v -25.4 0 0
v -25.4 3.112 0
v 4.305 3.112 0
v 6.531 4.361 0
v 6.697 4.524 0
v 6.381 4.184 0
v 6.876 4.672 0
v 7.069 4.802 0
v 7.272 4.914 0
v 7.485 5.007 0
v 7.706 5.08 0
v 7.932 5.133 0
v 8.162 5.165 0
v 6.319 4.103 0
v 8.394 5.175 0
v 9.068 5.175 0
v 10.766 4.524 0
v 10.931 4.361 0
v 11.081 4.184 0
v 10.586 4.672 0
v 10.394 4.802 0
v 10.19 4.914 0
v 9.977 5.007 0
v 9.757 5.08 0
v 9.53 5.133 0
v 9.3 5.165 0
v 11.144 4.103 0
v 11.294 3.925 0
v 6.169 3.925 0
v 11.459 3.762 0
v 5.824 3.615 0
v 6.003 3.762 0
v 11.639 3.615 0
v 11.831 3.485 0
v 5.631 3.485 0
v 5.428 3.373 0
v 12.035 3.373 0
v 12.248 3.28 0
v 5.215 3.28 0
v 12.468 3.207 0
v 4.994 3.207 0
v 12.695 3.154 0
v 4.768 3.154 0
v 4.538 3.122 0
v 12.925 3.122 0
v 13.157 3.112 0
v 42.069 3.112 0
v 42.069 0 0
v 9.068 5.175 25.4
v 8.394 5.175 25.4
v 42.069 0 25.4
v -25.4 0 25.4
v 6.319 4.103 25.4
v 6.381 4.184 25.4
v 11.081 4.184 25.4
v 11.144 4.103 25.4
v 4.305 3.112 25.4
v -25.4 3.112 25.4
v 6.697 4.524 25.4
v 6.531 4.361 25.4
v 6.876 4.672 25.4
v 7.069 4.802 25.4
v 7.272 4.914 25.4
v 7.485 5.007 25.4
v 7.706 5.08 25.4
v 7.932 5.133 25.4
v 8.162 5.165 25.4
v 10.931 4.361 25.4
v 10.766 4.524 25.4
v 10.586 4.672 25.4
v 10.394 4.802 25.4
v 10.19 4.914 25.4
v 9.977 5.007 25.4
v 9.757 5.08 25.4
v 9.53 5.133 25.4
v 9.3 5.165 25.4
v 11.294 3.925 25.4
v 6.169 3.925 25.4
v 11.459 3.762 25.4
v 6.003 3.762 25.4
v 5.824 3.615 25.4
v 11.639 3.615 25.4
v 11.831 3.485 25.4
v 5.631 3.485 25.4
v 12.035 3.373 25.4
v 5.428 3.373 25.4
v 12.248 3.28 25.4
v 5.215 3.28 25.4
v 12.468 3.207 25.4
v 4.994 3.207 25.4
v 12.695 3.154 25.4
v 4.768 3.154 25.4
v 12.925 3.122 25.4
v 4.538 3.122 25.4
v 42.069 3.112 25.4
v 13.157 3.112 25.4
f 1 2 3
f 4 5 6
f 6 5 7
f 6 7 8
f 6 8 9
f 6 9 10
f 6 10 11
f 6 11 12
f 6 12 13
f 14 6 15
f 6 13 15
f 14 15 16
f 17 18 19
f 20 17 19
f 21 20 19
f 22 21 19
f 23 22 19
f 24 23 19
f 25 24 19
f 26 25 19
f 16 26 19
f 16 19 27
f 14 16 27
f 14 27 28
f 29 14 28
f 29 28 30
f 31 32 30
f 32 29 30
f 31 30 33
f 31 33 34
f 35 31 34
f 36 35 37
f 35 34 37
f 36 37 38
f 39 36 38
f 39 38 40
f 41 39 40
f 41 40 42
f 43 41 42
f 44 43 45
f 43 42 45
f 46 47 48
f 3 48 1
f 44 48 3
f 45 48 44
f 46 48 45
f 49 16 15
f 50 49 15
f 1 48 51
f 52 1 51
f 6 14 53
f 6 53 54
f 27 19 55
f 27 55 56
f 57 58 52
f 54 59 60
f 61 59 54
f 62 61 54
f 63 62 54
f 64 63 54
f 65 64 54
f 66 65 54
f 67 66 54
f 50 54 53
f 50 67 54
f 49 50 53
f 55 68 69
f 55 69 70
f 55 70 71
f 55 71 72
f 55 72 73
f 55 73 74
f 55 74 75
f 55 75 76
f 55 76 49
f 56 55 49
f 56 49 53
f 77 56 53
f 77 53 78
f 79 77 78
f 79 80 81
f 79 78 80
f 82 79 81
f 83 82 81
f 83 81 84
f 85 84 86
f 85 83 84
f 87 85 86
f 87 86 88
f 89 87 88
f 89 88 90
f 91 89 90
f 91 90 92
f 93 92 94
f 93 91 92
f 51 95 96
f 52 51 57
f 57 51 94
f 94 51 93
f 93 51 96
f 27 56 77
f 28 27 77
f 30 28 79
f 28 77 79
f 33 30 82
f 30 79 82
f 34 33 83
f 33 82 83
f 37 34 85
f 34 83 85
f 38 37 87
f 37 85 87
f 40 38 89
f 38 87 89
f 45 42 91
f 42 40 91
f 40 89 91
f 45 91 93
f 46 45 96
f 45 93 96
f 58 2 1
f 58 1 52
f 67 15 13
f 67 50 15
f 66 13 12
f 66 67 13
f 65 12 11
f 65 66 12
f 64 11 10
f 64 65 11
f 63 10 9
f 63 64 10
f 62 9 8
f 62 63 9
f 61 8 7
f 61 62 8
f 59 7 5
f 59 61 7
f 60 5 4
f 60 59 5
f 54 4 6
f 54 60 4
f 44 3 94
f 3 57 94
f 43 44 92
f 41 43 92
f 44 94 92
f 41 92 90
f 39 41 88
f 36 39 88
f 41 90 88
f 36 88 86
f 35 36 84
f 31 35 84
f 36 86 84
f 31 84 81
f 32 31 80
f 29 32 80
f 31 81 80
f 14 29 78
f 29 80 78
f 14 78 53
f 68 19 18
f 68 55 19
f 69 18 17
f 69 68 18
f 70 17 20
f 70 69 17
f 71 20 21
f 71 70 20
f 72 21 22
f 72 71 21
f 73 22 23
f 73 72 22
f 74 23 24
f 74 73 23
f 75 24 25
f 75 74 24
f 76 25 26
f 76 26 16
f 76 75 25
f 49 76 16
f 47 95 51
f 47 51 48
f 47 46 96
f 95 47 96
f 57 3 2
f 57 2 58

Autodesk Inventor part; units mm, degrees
ref_plane "YZ Plane" through (0, 0, 0) normal (1, 0, 0) x (0, 1, 0)
ref_plane "XZ Plane" through (0, 0, 0) normal (0, 1, 0) x (-1, 0, 0)
ref_plane "XY Plane" through (0, 0, 0) normal (0, 0, 1) x (1, 0, 0)
sketch "Sketch1" plane through (0, 0, 0) normal (0, 0, 1) x (1, 0, 0)
  line L0 (0, 0) -> (4.7625, 0)
  line L1 (4.7625, 3.1115) -> (3.9687, 3.1115) construction
  line L2 (0, 3.1115) -> (0, 0)
  line L3 (4.7625, 0) -> (12.7, 0)
  line L4 (12.7, 0) -> (12.7, 3.1115) construction
  line L5 (12.7, 5.1753) -> (11.1125, 5.1753) construction
  line L6 (4.7625, 5.1753) -> (4.7625, 3.1115) construction
  line L7 (2.3812, 3.1115) -> (2.3812, 0) construction
  line L8 (8.7312, 5.1753) -> (8.7312, 0) construction
  line L9 (2.3812, 3.1115) -> (2.3812, 5.4927) construction
  circle A0 centre (2.3812, 5.4927) radius 2.3812 construction
  line L10 (6.35, 5.1753) -> (6.35, 0) construction
  line L11 (11.1125, 5.1753) -> (11.1125, 0) construction
  line L12 (4.7625, 3.1115) -> (12.7, 3.1115) construction
  line L13 (6.35, 5.1753) -> (4.7625, 5.1753) construction
  line L14 (4.7625, 3.1115) -> (4.7625, 0) construction
  line L15 (11.1125, 5.1753) -> (10.3187, 5.1753) construction
  line L16 (12.7, 3.1115) -> (12.7, 5.1753) construction
  line L17 (8.7312, 5.1753) -> (8.7312, 7.5565) construction
  circle A1 centre (8.7312, 7.5565) radius 2.3813 construction
  line L18 (0.7937, 3.1115) -> (0.7937, 0)
  line L19 (3.9687, 3.1115) -> (3.9687, 0)
  line L20 (7.1437, 5.1753) -> (7.1437, 0)
  line L21 (10.3187, 5.1753) -> (10.3187, 0)
  line L22 (3.9687, 3.1115) -> (0.7937, 3.1115)
  line L23 (0.7937, 3.1115) -> (0, 3.1115)
  line L24 (10.3187, 5.1753) -> (8.7312, 5.1753)
  line L25 (7.1437, 5.1753) -> (6.35, 5.1753) construction
  line L26 (8.7312, 5.1753) -> (7.1437, 5.1753)
  line L27 (3.9687, 3.1115) -> (7.1437, 5.1753)
  line L28 (0, 0) -> (0, 5.5563) construction
  line L29 (0, 5.5563) -> (17.4625, 5.5563) construction
  line L30 (0, 5.5563) -> (0, 7.9375) construction
  line L31 (0, 7.9375) -> (17.4625, 7.9375) construction
  line L32 (12.7, 3.1115) -> (13.4937, 3.1115) construction
  line L33 (12.7, 0) -> (17.4625, 0)
  line L34 (17.4625, 0) -> (17.4625, 3.1115)
  line L35 (15.0812, 0) -> (15.0812, 3.1115) construction
  line L36 (13.4937, 3.1115) -> (13.4937, 0)
  line L37 (16.6687, 3.1115) -> (16.6687, 0)
  line L38 (13.4937, 3.1115) -> (15.0812, 3.1115)
  line L39 (16.6687, 3.1115) -> (17.4625, 3.1115)
  line L40 (15.0812, 3.1115) -> (16.6687, 3.1115)
  line L41 (15.0812, 3.1115) -> (15.0812, 5.4928) construction
  line L42 (10.3187, 5.1753) -> (13.4937, 3.1115)
  line L43 (0, -12.7) -> (0, 0) construction
  line L44 (0, -7.1437) -> (26.1938, -7.1437) construction
  line L45 (0, -4.7625) -> (26.1938, -4.7625) construction
  line L46 (26.1938, -4.7625) -> (26.1938, -7.1437) construction
  line L47 (26.1938, -7.1437) -> (26.1938, -12.7) construction
  line L48 (26.1938, -12.7) -> (0, -12.7) construction
  line L49 (26.1938, -6.35) -> (34.3852, -6.35) construction
  line L50 (26.1938, -12.7) -> (34.3852, -12.7) construction
  line L51 (34.3852, -12.7) -> (34.3852, -6.35) construction
  line L52 (16.6688, -4.7625) -> (16.6688, -12.7) construction
  circle A2 centre (16.6688, -5.1435) radius 2.3813 construction
  circle A3 centre (16.6688, -7.2073) radius 2.3813 construction
  circle A4 centre (10.3187, -5.1435) radius 2.3813 construction
  circle A5 centre (10.3187, -7.2073) radius 2.3813 construction
  line L53 (10.3187, -4.7625) -> (10.3187, -12.7) construction
  line L54 (0, -7.5248) -> (26.1938, -7.5248) construction
  line L55 (8.7312, -7.5248) -> (8.7312, -12.7) construction
  line L56 (5.5562, -7.5248) -> (5.5562, -12.7) construction
  line L57 (18.2563, -7.5248) -> (18.2563, -12.7) construction
  line L58 (21.4313, -7.5248) -> (21.4313, -12.7) construction
  line L59 (0, -9.5885) -> (26.1938, -9.5885) construction
  line L60 (5.5562, -9.5885) -> (8.7312, -7.5248) construction
  line L61 (18.2563, -7.5248) -> (21.4312, -9.5885) construction
  line L62 (11.9062, -7.5248) -> (11.9062, -12.7) construction
  line L63 (15.0812, -7.5248) -> (15.0812, -12.7) construction
  line L64 (11.9062, -7.5248) -> (15.0812, -9.5885) construction
  line L65 (21.4313, -9.3266) -> (34.3852, -9.3266) construction
  line L66 (24.6063, -9.3266) -> (24.6063, -12.7) construction
  line L67 (21.4313, -9.3266) -> (20.1197, -7.1437) construction
  line L68 (26.1938, -9.5885) -> (30.9563, -9.5885) construction
  line L69 (30.9563, -9.5885) -> (30.9563, -12.7) construction
  line L70 (31.75, -9.3266) -> (31.75, -12.7) construction
  line L71 (31.75, -12.7) -> (29.723, -9.3266) construction
  line L72 (0, -4.7625) -> (-1.5875, -4.7625) construction
  line L73 (-1.5875, -4.7625) -> (-1.5875, -9.3266) construction
  line L74 (-1.5875, -9.3266) -> (5.5562, -9.3266) construction
  line L75 (1.4233, 7.874) -> (3.7622, 7.874)
  line L76 (5.5562, 3.1115) -> (7.1437, 5.1753)
  line L77 (10.3187, 5.1753) -> (11.9062, 3.1115)
  line L78 (11.9062, 3.1115) -> (13.4937, 3.1115)
  line L79 (5.5562, 3.1115) -> (3.9687, 3.1115)
  dimension "d8" = 6.35
  dimension "d9" = 5.1753
  dimension "d10" = 4.7625
  dimension "d11" = 2.3813
  dimension "d12" = 3.175
  dimension "d13" = 3.175
  dimension "d14" = 4.7625
  dimension "d15" = 2.3813
  dimension "d16" = 3.1115
  dimension "d17" = 5.5563
  dimension "d18" = 7.9375
  dimension "d19" = 6.35
  dimension "d20" = 3.175
  dimension "d21" = 2.3813
  dimension "d25" = 12.7
  dimension "d26" = 5.5563
  dimension "d27" = 7.9375
  dimension "d28" = 26.1938
  dimension "d29" = 8.1915
  dimension "d30" = 6.35
  dimension "d33" = 9.525
  dimension "d35" = 0.381
  dimension "d36" = 0.0635
  dimension "d38" = 6.35
  dimension "d39" = 0.381
  dimension "d40" = 0.381
  dimension "d41" = 0.0635
  dimension "d42" = 0.0635
  dimension "d43" = 9.525
  dimension "d46" = 1.5875
  dimension "d47" = 4.7625
  dimension "d48" = 1.5875
  dimension "d49" = 4.7625
  dimension "d50" = 3.1115
  dimension "d51" = 1.5875
  dimension "d52" = 4.7625
  dimension "d53" = 3.3734
  dimension "d54" = 3.175
  dimension "d55" = 31
  dimension "d56" = 9.525
  dimension "d57" = 9.525
  dimension "d59" = 0.7937
  dimension "d60" = 31
  dimension "d61" = 1.5875
  dimension "d62" = 3.3734
  dimension "d63" = 0.0635
  dimension "d70" = 0.7937
  dimension "d71" = 0.7937
extrude "Extrusion1" add sketch "Sketch1" along normal blind 25.4 contours L2 L23 L18 L0 | L18 L22 L19 L0 | L19 L79 L76 L20 L3 L0 | L20 L26 L24 L21 L3 | L21 L77 L78 L36 L33 L3 | L36 L38 L40 L37 L33
sketch "Sketch2" plane through (16.6687, 0, 0) normal (1, 0, 0) x (0, 0, -1)
  line L0 (0, 0) -> (0, 3.1115) projected
  line L1 (0, 3.1115) -> (-25.4, 3.1115) projected
  line L2 (-25.4, 0) -> (-25.4, 3.1115) projected
  line L3 (0, 0) -> (-25.4, 0) projected
extrude "Extrusion2" add sketch "Sketch2" along normal blind 25.4
sketch "Sketch3" plane through (0, 0, 0) normal (-1, 0, 0) x (0, 0, 1)
  line L0 (0, 3.1115) -> (0, 0) projected
  line L1 (0, 0) -> (25.4, 0) projected
  line L2 (25.4, 3.1115) -> (25.4, 0) projected
  line L3 (0, 3.1115) -> (25.4, 3.1115) projected
extrude "Extrusion3" add sketch "Sketch3" along normal blind 25.4
fillet "Fillet1" radius 2.54 4 edges at (10.3187, 5.1753, 12.7) (7.1437, 5.1753, 12.7) (11.9062, 3.1115, 12.7) (5.5562, 3.1115, 12.7)
equation "\"d19\" = d8"
equation "\"d26\" = d17"
equation "\"d27\" = d18"
equation "\"d39\" = d35"
equation "\"d40\" = d39"
equation "\"d41\" = d36"
equation "\"d42\" = d41"
equation "\"d50\" = d16"
equation "\"d51\" = d46"
equation "\"d52\" = d47"
equation "\"d57\" = d56"
equation "\"d60\" = d55"
equation "\"d62\" = d53"
properties part number "Sketch - Ball Shifting Shaft"
